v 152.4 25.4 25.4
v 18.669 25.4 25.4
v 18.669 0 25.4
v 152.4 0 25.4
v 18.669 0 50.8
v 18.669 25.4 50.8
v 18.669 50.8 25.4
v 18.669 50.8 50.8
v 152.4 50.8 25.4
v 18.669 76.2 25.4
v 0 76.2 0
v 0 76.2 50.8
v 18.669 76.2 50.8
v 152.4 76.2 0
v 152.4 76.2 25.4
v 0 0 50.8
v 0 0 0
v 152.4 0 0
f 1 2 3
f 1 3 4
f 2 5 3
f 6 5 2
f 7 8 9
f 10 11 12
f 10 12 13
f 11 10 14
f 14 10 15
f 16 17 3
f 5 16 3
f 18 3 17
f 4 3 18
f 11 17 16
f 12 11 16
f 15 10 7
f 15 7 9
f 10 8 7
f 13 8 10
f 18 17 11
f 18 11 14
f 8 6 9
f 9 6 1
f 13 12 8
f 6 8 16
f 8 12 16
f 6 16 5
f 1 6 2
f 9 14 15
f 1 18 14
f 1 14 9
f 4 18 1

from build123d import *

# Parameters (mm, degrees)
F0_W     = 152.4
F0_H     = 50.8
F1_DEPTH = 76.2
F2_W     = 133.730998
F2_H     = 25.4
F3_DEPTH = 25.4
F4_W     = 133.730998
F4_H     = 25.4
F5_DEPTH = 25.4
F7_DEPTH = 25.4


with BuildPart() as f1:
    # F0 (on Front) → F1 (new body)
    with BuildSketch(Plane.XZ):
        with Locations((76.2, 25.4)):
            Rectangle(F0_W, F0_H)
    extrude(amount=-F1_DEPTH)

    # F2 (on face) → F3 (cut)
    with BuildSketch(Plane.XY.offset(50.8)):
        with Locations((85.534501, 12.7)):
            Rectangle(F2_W, F2_H)
    extrude(amount=-F3_DEPTH, mode=Mode.SUBTRACT)

    # F4 (on face) → F5 (cut)
    with BuildSketch(Plane.XY.offset(50.8)):
        with Locations((85.534501, 63.5)):
            Rectangle(F4_W, F4_H)
    extrude(amount=-F5_DEPTH, mode=Mode.SUBTRACT)

    # F6 (on face) → F7 (cut)
    with BuildSketch(Plane.XZ.offset(-25.4)):
        Polygon((152.4, 50.8), (18.669002, 50.8), (152.4, 25.4), align=None)
    extrude(amount=-F7_DEPTH, mode=Mode.SUBTRACT)


solid = f1.part
